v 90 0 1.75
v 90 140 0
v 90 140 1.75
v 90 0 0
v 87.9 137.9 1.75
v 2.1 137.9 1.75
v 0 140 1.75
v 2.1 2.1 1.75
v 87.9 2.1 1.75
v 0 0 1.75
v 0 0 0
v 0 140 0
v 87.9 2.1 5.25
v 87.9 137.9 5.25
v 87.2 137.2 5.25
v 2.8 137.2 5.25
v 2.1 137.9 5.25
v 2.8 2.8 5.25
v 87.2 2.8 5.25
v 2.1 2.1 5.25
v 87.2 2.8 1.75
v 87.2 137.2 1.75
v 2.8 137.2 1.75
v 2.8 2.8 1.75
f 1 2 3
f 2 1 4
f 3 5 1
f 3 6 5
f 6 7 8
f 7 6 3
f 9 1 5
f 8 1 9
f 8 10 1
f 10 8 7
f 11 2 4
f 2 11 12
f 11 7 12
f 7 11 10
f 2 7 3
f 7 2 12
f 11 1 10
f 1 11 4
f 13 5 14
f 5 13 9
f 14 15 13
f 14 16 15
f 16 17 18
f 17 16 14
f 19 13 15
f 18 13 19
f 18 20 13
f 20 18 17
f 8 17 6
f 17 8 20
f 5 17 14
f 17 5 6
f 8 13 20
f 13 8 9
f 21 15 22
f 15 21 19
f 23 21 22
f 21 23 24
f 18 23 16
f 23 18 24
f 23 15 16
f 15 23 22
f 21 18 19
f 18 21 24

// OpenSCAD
//everything is in units of millimeters
resolution = 0.35;

//variables to keep in-sync with the other scad file
mainDepth = 90;
mainWidth = 140;
mainHeight = 42;
mainShellThickness = 5 * resolution;

margin = mainShellThickness + resolution;
lidThickness = resolution * 5; //z-axis
lidWidth = resolution * 2; //x & y axis thickness of the wall
innerLipHeight = resolution * 10;

difference() {
  union() {
    //top cover of the lid
    cube([mainDepth, mainWidth, lidThickness]);
    
    //the inner lip
    translate([margin, margin, lidThickness]) {
      cube([mainDepth - margin*2, mainWidth - margin*2, innerLipHeight]);
    };
  };
  
  //cutting out the inside to save on plastic used
  translate([margin + lidWidth, margin + lidWidth, lidThickness]) {
    cube([mainDepth - margin*2 - lidWidth*2, mainWidth - margin*2 - lidWidth*2, innerLipHeight]);
  }
};
